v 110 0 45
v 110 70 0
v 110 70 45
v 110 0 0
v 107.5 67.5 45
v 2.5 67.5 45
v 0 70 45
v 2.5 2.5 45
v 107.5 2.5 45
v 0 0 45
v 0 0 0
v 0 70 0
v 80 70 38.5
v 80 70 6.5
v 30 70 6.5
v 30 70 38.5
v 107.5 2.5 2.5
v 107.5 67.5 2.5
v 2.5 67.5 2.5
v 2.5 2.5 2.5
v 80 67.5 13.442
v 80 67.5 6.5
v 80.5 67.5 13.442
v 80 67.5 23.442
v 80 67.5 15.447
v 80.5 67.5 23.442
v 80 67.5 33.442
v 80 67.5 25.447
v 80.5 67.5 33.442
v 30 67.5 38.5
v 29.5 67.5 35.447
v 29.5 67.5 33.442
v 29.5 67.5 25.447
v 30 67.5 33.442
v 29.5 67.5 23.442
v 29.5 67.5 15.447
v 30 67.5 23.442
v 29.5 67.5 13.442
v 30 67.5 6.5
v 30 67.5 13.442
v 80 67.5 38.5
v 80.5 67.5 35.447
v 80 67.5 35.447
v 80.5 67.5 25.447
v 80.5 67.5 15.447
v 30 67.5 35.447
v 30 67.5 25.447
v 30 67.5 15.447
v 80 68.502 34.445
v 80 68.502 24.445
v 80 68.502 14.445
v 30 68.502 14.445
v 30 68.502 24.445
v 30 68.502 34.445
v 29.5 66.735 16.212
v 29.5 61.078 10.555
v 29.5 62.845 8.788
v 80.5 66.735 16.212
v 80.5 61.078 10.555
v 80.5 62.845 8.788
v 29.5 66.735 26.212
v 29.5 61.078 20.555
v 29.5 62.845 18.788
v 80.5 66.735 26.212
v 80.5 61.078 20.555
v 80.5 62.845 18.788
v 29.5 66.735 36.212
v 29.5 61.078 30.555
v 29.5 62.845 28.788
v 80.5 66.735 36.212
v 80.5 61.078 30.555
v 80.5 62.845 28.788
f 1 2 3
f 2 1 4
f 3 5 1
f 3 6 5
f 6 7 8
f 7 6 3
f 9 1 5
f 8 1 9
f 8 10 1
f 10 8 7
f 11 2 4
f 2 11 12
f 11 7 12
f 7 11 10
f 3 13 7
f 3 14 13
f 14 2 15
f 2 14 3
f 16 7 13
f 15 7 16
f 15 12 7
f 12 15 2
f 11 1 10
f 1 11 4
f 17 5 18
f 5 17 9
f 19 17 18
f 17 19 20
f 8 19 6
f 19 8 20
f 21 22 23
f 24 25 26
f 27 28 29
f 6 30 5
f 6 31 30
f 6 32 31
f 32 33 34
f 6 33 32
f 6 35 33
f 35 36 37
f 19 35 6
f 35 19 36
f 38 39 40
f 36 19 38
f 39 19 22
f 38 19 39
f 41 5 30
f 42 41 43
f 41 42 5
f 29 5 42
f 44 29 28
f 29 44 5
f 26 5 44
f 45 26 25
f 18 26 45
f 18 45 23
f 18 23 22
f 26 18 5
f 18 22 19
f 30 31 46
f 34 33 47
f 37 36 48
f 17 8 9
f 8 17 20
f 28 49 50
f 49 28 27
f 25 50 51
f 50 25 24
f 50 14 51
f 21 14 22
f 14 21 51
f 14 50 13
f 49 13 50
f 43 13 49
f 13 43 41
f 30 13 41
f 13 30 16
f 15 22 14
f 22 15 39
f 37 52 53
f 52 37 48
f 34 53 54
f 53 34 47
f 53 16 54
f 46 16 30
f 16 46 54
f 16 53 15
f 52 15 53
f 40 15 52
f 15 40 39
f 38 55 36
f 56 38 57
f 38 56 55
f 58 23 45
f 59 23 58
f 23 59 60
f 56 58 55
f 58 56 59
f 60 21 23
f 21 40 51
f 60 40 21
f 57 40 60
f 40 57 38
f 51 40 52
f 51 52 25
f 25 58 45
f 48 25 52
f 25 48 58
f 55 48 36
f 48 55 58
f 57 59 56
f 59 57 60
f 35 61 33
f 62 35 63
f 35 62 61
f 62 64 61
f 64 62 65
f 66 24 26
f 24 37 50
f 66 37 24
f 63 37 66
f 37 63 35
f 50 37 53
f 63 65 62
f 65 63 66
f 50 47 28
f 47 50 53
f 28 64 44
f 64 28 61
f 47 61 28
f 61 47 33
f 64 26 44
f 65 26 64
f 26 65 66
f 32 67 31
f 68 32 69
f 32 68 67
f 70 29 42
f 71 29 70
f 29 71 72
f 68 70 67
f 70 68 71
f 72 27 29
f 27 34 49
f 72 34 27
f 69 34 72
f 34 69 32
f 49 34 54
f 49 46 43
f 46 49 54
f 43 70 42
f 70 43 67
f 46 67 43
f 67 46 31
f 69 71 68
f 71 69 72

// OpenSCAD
$fn = 32;

// ----------------------------------------------------------------------
// Vent box: louvers enclosure
// ----------------------------------------------------------------------

// --- parameters (mm) ---
box_l = 110;              // box length, X
box_w = 70;               // box width, Y
box_h = 45;               // box height, Z
wall_t = 2.5;             // shell wall thickness
win_l = 50;               // vent window width, X
win_h = 32;               // vent window height, Z
slat_t = 2.5;             // louver slat thickness
slat_d = 8;               // louver slat depth
slat_a = 45;              // louver slat angle, degrees
slat_pitch = 10;          // louver pitch
slat_yc = 64.79;          // slat centreline Y
fit_tol = 0.1;            // tolerance for press fits, mm
free_tol = 0.3;           // tolerance for clearance fits, mm

win_z0 = (box_h - win_h) / 2;  // window lower edge Z
n_slats = 3;  // louver count
slat_z0 = win_z0 + (win_h - (n_slats - 1) * slat_pitch) / 2;

difference() {
  union() {
    difference() {
      cube([box_l, box_w, box_h]);
  translate([wall_t, wall_t, wall_t])
    cube([box_l - 2 * wall_t, box_w - 2 * wall_t, box_h]);
  translate([(box_l - win_l) / 2, box_w - wall_t - 1, win_z0])
    cube([win_l, wall_t + 2, win_h]);
    }
    for (i = [0 : n_slats - 1])
      translate([box_l / 2, slat_yc, slat_z0 + i * slat_pitch])
        rotate([slat_a, 0, 0])
          cube([win_l + 1, slat_d, slat_t], center = true);
  }
}
